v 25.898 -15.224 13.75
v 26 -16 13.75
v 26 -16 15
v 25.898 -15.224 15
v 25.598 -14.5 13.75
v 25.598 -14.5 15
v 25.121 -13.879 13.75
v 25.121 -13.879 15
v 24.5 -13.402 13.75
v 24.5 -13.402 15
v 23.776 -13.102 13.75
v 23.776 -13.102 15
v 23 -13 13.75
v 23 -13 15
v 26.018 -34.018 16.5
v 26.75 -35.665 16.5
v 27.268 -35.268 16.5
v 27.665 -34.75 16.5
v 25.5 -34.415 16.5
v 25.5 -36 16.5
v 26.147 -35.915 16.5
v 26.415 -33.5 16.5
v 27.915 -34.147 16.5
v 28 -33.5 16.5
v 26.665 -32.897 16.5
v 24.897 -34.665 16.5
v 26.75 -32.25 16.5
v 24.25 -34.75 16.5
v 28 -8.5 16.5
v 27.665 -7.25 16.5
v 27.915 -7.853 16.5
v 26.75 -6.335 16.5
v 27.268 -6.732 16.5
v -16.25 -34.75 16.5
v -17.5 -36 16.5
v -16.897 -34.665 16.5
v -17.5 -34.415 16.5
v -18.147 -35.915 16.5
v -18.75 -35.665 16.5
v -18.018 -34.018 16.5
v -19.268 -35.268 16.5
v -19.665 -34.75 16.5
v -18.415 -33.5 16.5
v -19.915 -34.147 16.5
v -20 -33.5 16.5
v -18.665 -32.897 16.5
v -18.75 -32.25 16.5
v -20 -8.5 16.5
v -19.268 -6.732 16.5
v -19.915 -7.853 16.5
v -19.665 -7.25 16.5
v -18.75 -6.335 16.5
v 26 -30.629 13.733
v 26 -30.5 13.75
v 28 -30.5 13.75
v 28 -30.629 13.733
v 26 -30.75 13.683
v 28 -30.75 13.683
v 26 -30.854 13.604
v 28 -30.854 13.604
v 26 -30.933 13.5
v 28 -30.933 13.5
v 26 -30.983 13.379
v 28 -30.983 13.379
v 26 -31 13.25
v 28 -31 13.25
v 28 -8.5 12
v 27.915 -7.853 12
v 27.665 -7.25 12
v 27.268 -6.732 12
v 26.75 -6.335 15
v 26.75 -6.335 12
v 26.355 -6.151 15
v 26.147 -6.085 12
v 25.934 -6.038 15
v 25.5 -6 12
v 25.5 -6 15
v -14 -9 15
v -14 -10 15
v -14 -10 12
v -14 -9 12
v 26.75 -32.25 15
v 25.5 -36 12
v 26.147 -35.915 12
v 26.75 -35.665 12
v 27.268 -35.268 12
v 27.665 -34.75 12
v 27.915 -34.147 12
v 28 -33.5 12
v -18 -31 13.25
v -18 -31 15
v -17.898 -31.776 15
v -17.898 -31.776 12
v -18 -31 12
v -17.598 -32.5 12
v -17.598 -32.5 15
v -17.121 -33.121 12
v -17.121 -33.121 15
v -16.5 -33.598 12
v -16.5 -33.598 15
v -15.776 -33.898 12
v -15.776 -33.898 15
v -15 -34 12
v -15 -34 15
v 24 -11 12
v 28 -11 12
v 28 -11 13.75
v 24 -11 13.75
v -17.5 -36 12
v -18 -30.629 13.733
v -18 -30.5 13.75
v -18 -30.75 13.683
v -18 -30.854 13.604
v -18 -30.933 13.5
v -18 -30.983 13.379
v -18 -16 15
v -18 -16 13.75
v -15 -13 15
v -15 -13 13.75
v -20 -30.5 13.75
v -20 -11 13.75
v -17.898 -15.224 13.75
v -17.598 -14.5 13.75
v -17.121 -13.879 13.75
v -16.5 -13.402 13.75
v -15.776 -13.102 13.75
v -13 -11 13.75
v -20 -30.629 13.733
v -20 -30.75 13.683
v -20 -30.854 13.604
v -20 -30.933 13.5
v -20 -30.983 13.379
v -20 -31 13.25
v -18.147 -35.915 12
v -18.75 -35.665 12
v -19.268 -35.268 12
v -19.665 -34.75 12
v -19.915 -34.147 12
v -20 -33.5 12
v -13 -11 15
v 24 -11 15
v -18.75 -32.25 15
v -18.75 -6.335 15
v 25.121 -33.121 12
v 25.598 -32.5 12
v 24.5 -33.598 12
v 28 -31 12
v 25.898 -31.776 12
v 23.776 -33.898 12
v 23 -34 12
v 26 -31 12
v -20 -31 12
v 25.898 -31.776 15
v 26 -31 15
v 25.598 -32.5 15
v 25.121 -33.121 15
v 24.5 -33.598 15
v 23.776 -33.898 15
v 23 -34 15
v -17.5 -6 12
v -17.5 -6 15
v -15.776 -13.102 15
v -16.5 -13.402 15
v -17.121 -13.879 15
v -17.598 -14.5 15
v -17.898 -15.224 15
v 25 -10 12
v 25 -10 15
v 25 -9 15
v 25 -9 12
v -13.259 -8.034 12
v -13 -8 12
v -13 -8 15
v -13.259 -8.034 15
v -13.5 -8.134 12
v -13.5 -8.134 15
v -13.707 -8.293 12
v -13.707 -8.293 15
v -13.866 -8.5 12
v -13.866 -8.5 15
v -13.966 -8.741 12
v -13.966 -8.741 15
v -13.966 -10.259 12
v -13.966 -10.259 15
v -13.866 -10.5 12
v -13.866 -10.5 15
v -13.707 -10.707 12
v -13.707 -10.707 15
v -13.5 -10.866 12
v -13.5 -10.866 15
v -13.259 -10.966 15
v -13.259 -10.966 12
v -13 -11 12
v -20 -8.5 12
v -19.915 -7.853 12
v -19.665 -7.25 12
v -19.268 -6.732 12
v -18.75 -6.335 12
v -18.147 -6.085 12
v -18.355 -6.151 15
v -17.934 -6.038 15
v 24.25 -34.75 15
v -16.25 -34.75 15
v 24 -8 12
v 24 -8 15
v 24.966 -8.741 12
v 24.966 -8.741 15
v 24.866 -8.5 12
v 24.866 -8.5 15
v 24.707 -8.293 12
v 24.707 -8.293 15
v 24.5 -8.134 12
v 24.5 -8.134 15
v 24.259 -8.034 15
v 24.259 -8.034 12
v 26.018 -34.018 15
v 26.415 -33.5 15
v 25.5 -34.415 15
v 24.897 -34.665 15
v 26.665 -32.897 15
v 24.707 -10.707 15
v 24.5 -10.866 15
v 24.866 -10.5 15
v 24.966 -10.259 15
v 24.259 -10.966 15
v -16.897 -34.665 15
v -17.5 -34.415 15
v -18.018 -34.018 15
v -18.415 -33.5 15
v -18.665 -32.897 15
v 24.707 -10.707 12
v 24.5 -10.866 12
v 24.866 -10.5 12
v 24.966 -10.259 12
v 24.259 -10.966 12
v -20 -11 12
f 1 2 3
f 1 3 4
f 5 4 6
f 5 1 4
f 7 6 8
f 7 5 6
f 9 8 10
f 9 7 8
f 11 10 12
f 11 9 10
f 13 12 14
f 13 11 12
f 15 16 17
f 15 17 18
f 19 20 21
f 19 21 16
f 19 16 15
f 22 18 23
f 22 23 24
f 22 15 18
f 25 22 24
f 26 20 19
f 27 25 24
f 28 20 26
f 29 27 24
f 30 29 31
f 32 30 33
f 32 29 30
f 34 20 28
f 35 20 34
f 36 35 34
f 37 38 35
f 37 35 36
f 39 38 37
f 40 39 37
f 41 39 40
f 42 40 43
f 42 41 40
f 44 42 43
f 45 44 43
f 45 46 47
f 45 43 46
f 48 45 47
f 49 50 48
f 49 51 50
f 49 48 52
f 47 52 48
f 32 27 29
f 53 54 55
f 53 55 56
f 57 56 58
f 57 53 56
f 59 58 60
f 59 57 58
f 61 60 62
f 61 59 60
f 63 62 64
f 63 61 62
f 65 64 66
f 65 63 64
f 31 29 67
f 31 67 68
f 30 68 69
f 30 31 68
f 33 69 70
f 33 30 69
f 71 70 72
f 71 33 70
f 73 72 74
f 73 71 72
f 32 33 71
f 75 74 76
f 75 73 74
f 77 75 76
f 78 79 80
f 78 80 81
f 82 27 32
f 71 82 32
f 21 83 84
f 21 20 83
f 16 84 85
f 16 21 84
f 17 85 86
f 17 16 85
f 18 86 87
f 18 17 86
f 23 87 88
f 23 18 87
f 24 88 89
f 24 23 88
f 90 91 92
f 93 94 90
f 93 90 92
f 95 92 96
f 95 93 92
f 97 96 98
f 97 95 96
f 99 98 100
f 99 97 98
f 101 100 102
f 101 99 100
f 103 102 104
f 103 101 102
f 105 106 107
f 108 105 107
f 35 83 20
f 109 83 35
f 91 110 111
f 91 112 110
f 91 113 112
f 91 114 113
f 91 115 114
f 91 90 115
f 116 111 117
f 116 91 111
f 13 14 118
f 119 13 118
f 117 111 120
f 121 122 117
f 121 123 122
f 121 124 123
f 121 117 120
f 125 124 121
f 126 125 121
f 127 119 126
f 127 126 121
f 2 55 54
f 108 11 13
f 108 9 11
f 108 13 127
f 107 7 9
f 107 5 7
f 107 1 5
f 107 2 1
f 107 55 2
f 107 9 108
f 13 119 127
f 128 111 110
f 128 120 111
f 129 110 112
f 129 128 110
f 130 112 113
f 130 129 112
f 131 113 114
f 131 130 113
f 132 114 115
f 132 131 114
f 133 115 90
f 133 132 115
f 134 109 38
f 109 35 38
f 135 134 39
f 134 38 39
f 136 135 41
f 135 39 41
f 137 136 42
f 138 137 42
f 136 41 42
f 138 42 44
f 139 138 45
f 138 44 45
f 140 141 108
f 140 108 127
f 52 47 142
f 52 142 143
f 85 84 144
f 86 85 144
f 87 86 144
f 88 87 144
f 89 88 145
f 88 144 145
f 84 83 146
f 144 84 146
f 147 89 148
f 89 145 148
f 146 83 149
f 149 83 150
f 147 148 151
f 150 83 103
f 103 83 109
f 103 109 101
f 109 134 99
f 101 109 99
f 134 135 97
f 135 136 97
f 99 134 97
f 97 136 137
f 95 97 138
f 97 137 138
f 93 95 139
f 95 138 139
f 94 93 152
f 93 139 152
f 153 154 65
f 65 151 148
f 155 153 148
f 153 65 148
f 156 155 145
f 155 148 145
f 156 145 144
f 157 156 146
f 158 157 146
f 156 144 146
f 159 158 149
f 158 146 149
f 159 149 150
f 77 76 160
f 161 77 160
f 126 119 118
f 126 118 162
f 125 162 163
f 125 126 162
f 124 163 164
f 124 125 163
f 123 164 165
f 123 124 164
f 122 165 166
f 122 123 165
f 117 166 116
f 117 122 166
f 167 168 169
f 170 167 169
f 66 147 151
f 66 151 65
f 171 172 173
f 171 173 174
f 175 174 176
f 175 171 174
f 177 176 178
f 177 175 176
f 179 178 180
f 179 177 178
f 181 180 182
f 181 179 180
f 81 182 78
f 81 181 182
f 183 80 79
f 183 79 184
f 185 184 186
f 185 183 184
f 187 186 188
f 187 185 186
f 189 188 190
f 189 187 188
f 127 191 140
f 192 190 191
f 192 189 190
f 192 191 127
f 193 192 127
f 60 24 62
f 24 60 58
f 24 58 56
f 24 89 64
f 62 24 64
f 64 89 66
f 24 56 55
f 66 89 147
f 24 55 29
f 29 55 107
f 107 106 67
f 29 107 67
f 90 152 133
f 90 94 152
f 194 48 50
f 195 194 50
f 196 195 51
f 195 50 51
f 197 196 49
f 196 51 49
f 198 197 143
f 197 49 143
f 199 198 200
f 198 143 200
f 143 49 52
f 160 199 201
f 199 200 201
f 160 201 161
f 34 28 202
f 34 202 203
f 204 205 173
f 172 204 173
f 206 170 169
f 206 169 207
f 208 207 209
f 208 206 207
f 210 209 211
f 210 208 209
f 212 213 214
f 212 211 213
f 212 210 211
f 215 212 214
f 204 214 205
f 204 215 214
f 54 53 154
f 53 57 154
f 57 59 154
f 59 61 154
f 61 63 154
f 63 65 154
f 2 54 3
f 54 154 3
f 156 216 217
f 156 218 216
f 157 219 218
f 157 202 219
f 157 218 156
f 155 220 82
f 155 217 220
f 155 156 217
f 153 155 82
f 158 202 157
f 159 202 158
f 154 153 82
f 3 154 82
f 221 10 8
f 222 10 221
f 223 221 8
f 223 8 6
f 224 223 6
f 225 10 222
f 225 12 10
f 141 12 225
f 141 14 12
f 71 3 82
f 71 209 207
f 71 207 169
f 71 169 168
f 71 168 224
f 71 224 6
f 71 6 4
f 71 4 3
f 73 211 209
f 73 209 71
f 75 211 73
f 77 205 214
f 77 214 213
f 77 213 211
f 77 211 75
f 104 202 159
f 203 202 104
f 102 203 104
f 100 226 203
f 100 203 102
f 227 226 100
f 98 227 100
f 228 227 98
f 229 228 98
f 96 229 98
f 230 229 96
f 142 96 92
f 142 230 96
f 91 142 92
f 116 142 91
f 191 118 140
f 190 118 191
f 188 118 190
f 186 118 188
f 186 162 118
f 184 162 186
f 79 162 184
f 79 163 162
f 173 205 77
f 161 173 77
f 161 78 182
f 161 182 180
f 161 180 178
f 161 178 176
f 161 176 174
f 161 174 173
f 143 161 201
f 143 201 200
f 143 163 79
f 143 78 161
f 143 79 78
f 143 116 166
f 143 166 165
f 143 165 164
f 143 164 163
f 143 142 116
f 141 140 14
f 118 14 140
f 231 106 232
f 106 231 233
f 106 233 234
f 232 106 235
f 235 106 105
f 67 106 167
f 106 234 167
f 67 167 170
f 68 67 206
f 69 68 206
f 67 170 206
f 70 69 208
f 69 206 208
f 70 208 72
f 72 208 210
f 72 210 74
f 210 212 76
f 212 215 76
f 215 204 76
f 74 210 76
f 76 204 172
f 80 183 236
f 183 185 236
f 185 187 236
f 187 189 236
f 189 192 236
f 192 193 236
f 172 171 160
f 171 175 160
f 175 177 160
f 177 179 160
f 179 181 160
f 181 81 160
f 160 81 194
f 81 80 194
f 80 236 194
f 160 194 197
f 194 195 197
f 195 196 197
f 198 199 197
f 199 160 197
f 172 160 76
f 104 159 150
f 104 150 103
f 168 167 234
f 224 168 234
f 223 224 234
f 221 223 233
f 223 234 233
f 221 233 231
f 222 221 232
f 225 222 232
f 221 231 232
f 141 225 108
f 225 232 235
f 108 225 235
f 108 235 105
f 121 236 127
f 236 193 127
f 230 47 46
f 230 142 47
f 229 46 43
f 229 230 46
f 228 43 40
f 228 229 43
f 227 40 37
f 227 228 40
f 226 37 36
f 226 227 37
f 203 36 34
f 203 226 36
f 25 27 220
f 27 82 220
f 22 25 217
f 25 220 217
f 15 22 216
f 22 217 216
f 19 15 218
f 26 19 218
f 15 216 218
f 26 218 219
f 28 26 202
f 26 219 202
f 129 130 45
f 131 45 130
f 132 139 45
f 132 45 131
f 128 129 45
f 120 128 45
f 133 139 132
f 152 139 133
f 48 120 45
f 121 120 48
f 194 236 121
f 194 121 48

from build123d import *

# Parameters (mm, degrees)
SKETCH135_W             = 30
SKETCH135_H             = 48
PAD050_DEPTH            = 4.5
SKETCH137_W             = 3
SKETCH137_H             = 39
SKETCH137_W_2           = 21
SKETCH137_H_2           = 44
POCKET047_DEPTH         = 5
FILLET058_R             = 3
FILLET059_R             = 2.5
FILLET060_R             = 1
SKETCH138_W             = 30
SKETCH138_H             = 45.5
POCKET048_DEPTH         = 1.5
FILLET061_R             = 2.5
SKETCH139_W             = 20
SKETCH139_H             = 4
POCKET049_DEPTH         = 48.001
FILLET062_R             = 0.5
BODY057_PLACEMENT_ANGLE = 90


with BuildPart() as part:
    # Sketch135 → Pad050 (new body)
    with BuildSketch(Plane.XY):
        Rectangle(SKETCH135_W, SKETCH135_H)
    extrude(amount=PAD050_DEPTH)

    # Sketch137 (on Face6 of Pad050) → Pocket047 (cut)
    with BuildSketch(Plane.XY.offset(4.5)):
        with Locations((11.5, -1.5)):
            Rectangle(SKETCH137_W, SKETCH137_H)
        with Locations((-2.5, 0)):
            Rectangle(SKETCH137_W_2, SKETCH137_H_2)
    extrude(amount=-POCKET047_DEPTH, mode=Mode.SUBTRACT)

    # Fillet058
    fillet058_edges = [part.edges().sort_by_distance(p)[0] for p in [
        (8, 22, 2.25),
        (-13, 22, 2.25),
        (8, -22, 2.25),
        (-13, -22, 2.25),
    ]]
    fillet(fillet058_edges, radius=FILLET058_R)

    # Fillet059
    fillet059_edges = [part.edges().sort_by_distance(p)[0] for p in [
        (-15, 24, 2.25),
        (-15, -24, 2.25),
        (15, 24, 2.25),
        (15, -24, 2.25),
    ]]
    fillet(fillet059_edges, radius=FILLET059_R)

    # Fillet060
    fillet060_edges = [part.edges().sort_by_distance(p)[0] for p in [
        (10, 18, 2.25),
        (13, 18, 2.25),
        (13, -21, 2.25),
        (10, -21, 2.25),
    ]]
    fillet(fillet060_edges, radius=FILLET060_R)

    # Sketch138 (on Face26 of Fillet060) → Pocket048 (cut)
    with BuildSketch(Plane.XY.offset(4.5)):
        with Locations((1.25, 0)):
            Rectangle(SKETCH138_W, SKETCH138_H)
    extrude(amount=-POCKET048_DEPTH, mode=Mode.SUBTRACT)

    # Fillet061
    fillet061_edges = [part.edges().sort_by_distance(p)[0] for p in [
        (-13.75, 22.75, 3.75),
        (-13.75, -22.75, 3.75),
    ]]
    fillet(fillet061_edges, radius=FILLET061_R)

    # Sketch139 (on Face27 of Fillet061) → Pocket049 (cut, through all)
    with BuildSketch(Plane.XZ.offset(24)):
        with Locations((0, -0.25)):
            Rectangle(SKETCH139_W, SKETCH139_H)
    extrude(amount=-POCKET049_DEPTH, mode=Mode.SUBTRACT)

    # Fillet062
    fillet062_edges = [part.edges().sort_by_distance(p)[0] for p in [
        (-10, -23, 1.75),
        (-10, 23, 1.75),
    ]]
    fillet(fillet062_edges, radius=FILLET062_R)


with BuildPart() as part_1:
    # Body057 placement: moved
    add(part.part.moved(Location((4, -21, 12))).rotate(Axis((4, -21, 12), (0, 0, 1)), BODY057_PLACEMENT_ANGLE))


solid = part_1.part
